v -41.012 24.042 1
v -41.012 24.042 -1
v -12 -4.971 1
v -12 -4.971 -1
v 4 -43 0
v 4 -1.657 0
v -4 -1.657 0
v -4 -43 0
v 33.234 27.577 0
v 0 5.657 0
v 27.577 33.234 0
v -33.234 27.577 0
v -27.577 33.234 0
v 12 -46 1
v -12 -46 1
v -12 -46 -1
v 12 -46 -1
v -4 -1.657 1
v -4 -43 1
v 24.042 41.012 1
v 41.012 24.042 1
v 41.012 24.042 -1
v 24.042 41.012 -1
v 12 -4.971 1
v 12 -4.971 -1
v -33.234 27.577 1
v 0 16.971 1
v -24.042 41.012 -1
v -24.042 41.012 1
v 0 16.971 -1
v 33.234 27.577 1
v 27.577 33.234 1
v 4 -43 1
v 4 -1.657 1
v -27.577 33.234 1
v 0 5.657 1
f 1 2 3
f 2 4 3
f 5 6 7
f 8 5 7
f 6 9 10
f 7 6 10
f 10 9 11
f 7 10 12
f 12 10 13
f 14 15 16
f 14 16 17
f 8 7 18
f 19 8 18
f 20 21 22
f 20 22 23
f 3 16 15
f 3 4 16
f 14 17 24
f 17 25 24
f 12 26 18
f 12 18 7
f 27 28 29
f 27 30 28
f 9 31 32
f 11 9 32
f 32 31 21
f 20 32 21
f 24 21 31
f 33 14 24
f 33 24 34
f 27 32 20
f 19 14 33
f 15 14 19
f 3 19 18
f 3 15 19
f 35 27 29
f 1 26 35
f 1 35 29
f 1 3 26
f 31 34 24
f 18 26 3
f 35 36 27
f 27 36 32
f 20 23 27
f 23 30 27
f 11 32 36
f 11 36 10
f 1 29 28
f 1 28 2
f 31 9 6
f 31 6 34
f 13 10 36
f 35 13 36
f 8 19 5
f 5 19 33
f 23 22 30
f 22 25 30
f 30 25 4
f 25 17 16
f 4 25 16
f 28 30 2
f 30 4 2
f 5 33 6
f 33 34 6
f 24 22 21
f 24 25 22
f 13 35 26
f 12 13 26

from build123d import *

# Parameters (mm, degrees)
F1_DEPTH  = 43
F6_DEPTH  = 43
F8_DEPTH  = 43
F10_DEPTH = 43
F12_DEPTH = 43
F14_DEPTH = 43
F15_W     = 24
F15_H     = 2
F16_DEPTH = 3
F17_W     = 24
F17_H     = 2
F18_DEPTH = 3
F19_W     = 24
F19_H     = 2
F20_DEPTH = 3


with BuildPart() as f1:
    # F0 (on Front) → F1 (new body)
    with BuildSketch(Plane.XZ):
        Polygon((4, 0), (0, 0), (-4, 0), (-4, 1), (-12, 1), (-12, -1), (12, -1), (12, 1), (4, 1), align=None)
    extrude(amount=F1_DEPTH)

    # F5 (on face) → F6 (join)
    with BuildSketch(Plane(origin=(0, 0, 0), x_dir=(-0.7071067812, -0.7071067812, 0), z_dir=(-0.7071067812, 0.7071067812, 0))):
        Polygon((4, 0), (0, 0), (-4, 0), (-4, 1), (-12, 1), (-12, -1), (12, -1), (12, 1), (4, 1), align=None)
    extrude(amount=F6_DEPTH)

    # F7 (on face) → F8 (join)
    with BuildSketch(Plane(origin=(0, 0, 0), x_dir=(-0.7071067812, 0.7071067812, 0), z_dir=(0.7071067812, 0.7071067812, 0))):
        Polygon((4, 0), (0, 0), (-4, 0), (-4, 1), (-12, 1), (-12, -1), (12, -1), (12, 1), (4, 1), align=None)
    extrude(amount=F8_DEPTH)

    # F9 (on face) → F10 (cut)
    with BuildSketch(Plane.XZ.offset(43)):
        Polygon((-4, 0), (0, 0), (4, 0), (4, 1), (-4, 1), align=None)
    extrude(amount=-F10_DEPTH, mode=Mode.SUBTRACT)

    # F11 (on face) → F12 (cut)
    with BuildSketch(Plane(origin=(-30.405591591, 30.405591591, 0), x_dir=(-0.7071067812, -0.7071067812, 0), z_dir=(-0.7071067812, 0.7071067812, 0))):
        Polygon((-4, 0), (0, 0), (4, 0), (4, 1), (-4, 1), align=None)
    extrude(amount=-F12_DEPTH, mode=Mode.SUBTRACT)

    # F13 (on face) → F14 (cut)
    with BuildSketch(Plane(origin=(30.405591591, 30.405591591, 0), x_dir=(-0.7071067812, 0.7071067812, 0), z_dir=(0.7071067812, 0.7071067812, 0))):
        Polygon((-4, 0), (0, 0), (4, 0), (4, 1), (-4, 1), align=None)
    extrude(amount=-F14_DEPTH, mode=Mode.SUBTRACT)

    # F15 (on face) → F16 (join)
    with BuildSketch(Plane.XZ.offset(43)):
        Rectangle(F15_W, F15_H)
    extrude(amount=F16_DEPTH)

    # F17 (on face) → F18 (join)
    with BuildSketch(Plane(origin=(-30.405591591, 30.405591591, 0), x_dir=(-0.7071067812, -0.7071067812, 0), z_dir=(-0.7071067812, 0.7071067812, 0))):
        Rectangle(F17_W, F17_H)
    extrude(amount=F18_DEPTH)

    # F19 (on face) → F20 (join)
    with BuildSketch(Plane(origin=(30.405591591, 30.405591591, 0), x_dir=(-0.7071067812, 0.7071067812, 0), z_dir=(0.7071067812, 0.7071067812, 0))):
        Rectangle(F19_W, F19_H)
    extrude(amount=F20_DEPTH)


solid = f1.part
